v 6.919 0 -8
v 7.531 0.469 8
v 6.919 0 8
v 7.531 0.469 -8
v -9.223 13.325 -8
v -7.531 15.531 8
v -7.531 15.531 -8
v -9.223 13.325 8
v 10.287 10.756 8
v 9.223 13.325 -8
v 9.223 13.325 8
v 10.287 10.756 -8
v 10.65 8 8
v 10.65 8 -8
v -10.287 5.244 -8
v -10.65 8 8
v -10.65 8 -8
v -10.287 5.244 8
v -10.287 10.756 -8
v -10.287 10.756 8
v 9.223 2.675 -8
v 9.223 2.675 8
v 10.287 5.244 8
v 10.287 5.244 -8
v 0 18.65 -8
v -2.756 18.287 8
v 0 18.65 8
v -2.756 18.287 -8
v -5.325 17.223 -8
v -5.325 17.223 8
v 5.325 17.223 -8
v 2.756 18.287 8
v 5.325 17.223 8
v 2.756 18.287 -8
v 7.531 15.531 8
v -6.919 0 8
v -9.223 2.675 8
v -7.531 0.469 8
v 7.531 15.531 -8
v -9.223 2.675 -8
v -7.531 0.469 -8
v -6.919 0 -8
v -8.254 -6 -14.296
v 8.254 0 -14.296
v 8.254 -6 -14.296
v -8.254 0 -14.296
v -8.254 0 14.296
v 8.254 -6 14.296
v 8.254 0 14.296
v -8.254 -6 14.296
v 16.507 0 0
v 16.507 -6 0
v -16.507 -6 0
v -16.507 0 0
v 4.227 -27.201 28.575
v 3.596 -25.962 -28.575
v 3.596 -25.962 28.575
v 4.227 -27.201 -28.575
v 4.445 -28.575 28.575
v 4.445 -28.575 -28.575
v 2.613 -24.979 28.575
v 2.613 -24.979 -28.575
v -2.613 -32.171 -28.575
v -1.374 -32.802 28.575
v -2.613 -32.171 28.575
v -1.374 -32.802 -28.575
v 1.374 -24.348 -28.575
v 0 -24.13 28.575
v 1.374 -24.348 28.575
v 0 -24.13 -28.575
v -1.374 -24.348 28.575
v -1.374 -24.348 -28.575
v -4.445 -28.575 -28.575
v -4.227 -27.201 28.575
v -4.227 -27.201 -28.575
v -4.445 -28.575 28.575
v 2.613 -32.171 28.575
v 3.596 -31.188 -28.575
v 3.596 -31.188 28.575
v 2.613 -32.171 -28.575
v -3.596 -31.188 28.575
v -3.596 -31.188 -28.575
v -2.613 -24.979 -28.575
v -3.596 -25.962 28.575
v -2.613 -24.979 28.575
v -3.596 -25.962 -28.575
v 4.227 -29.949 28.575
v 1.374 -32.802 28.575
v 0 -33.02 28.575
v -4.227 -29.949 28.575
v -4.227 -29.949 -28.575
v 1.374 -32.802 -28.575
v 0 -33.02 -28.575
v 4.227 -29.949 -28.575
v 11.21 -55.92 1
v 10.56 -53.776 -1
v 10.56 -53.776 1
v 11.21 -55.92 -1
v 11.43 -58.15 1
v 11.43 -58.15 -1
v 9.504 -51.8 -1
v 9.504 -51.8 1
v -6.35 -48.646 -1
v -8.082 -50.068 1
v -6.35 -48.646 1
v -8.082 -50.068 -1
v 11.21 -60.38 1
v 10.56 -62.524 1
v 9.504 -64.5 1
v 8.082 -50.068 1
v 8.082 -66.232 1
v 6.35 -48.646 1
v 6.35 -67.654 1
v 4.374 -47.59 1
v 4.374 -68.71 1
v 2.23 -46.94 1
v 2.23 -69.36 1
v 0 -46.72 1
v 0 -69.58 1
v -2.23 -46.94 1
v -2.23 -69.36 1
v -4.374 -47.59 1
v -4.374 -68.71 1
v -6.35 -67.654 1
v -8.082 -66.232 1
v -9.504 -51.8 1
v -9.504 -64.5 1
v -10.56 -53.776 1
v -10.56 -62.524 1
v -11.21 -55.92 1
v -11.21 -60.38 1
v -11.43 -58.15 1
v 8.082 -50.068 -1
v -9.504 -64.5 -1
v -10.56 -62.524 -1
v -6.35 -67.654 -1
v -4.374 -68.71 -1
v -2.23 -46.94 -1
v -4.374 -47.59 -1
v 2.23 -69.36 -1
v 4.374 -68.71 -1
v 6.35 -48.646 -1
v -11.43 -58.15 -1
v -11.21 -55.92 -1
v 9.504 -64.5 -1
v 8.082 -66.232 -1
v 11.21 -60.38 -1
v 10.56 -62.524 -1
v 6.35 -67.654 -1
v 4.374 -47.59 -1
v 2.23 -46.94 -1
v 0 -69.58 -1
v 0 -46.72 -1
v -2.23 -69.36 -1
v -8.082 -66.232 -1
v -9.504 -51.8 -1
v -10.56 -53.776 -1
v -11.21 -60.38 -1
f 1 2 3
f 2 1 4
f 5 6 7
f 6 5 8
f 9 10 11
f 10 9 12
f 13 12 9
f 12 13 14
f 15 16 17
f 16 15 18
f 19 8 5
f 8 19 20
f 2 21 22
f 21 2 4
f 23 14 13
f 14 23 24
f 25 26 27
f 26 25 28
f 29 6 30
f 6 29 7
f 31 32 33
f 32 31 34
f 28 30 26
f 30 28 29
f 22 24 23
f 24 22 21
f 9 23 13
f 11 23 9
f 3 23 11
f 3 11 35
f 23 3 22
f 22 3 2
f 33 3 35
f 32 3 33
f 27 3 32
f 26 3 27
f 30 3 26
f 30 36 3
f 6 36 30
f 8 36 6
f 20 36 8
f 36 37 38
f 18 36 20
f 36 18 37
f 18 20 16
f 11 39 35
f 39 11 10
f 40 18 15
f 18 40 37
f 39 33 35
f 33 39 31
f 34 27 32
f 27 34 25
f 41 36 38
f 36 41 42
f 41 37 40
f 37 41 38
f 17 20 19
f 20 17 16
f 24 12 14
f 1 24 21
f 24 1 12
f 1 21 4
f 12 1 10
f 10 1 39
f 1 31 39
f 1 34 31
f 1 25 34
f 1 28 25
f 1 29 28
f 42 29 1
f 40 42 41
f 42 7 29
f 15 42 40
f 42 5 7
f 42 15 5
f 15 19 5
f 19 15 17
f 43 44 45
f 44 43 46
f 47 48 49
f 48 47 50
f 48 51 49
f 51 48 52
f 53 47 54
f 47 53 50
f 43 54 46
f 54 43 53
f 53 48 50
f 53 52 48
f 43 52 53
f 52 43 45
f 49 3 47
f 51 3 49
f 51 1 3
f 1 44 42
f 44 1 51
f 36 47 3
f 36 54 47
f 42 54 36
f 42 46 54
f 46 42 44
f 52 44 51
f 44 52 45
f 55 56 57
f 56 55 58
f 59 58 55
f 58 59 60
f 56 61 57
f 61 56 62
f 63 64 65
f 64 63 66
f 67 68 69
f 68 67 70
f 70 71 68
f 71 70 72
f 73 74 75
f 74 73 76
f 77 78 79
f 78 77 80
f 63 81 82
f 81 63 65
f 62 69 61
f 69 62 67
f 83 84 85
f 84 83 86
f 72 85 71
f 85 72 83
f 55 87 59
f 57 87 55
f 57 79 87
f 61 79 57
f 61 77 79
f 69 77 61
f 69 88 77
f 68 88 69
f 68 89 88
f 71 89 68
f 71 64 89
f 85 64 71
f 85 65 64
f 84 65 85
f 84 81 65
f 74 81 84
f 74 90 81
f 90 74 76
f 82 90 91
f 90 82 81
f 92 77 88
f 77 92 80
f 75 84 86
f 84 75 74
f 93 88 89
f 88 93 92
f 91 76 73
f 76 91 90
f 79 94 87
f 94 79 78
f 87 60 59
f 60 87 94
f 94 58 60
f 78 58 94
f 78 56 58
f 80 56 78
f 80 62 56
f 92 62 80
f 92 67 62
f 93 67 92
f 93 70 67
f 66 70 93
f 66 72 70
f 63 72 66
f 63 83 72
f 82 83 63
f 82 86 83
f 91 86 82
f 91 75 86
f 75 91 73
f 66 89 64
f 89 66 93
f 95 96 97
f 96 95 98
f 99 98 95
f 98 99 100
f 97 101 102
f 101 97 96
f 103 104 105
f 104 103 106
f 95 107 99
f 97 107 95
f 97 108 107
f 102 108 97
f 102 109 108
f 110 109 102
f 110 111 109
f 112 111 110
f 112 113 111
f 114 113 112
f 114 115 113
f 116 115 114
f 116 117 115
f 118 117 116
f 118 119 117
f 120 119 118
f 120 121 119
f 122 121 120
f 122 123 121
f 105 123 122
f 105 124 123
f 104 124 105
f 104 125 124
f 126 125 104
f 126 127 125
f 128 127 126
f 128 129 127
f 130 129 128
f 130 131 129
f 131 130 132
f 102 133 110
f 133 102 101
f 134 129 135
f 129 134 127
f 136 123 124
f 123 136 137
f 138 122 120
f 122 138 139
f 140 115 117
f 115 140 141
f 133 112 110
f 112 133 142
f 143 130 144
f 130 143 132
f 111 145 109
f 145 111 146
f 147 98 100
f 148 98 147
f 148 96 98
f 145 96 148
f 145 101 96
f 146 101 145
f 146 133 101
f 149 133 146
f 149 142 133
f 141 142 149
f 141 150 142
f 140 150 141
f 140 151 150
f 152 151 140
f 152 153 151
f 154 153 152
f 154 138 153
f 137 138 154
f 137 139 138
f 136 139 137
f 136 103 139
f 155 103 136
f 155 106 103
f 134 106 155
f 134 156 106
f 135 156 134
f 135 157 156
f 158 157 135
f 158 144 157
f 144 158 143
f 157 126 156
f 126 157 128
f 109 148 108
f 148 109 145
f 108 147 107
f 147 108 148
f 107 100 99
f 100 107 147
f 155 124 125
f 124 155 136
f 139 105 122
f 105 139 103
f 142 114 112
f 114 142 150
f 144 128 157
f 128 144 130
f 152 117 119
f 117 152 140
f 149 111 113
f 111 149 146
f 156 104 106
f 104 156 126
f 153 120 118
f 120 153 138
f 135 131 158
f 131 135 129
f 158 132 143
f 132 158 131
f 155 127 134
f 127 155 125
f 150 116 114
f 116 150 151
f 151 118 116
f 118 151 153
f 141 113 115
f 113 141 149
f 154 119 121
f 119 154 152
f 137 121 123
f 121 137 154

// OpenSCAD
// Auto-generated by scripts/author_from_manifest.py (Phase D.3).
// Source: data/phase_d_manifest.json (sku_intent='tyco-ty1234-qr-pendent-200f').
// Do not hand-edit — regenerate from the manifest.
//
// @part tyco_ty1234_qr_pendent_200f
// @kind sprinkler_head
// @category head.pendant.k56
// @display-name "Tyco TY1234 Quick-Response Pendent K5.6 200°F"
// @mfg tyco_fire_protection
// @mfg-pn TY1234
// @listing UL FM
// @hazard-classes LH OH1
// @price-usd 15.25
// @install-minutes 8
// @crew journeyman
// @k-factor 5.6
// @orientation pendant
// @response quick
// @temperature 200F
// @param size_in number default=0.5 label="Size" unit="in"
// @port inlet position=[0,0.014,0] direction=[0,1,0] style=NPT_threaded size_in=0.5 role=drop

size_in = 0.5;
k_factor = 5.6;

length_mm   = 57.15;
body_dia_mm = 25.40;
thread_od   = 21.3;
thread_len  = 16;
deflector_d = body_dia_mm * 0.9;

 union() {
    translate([0, thread_len/2, 0])
        cylinder(h = thread_len, d = thread_od, center = true, $fn = 24);
    translate([0, -3, 0])
        rotate([90, 0, 0])
        cylinder(h = 6, d = thread_od * 1.55, $fn = 6, center = true);
    translate([0, -length_mm/2, 0])
        cylinder(h = length_mm, d = body_dia_mm * 0.35, center = true, $fn = 20);
    translate([0, -length_mm - 1, 0])
        cylinder(h = 2, d = deflector_d, center = true, $fn = 32);
}
